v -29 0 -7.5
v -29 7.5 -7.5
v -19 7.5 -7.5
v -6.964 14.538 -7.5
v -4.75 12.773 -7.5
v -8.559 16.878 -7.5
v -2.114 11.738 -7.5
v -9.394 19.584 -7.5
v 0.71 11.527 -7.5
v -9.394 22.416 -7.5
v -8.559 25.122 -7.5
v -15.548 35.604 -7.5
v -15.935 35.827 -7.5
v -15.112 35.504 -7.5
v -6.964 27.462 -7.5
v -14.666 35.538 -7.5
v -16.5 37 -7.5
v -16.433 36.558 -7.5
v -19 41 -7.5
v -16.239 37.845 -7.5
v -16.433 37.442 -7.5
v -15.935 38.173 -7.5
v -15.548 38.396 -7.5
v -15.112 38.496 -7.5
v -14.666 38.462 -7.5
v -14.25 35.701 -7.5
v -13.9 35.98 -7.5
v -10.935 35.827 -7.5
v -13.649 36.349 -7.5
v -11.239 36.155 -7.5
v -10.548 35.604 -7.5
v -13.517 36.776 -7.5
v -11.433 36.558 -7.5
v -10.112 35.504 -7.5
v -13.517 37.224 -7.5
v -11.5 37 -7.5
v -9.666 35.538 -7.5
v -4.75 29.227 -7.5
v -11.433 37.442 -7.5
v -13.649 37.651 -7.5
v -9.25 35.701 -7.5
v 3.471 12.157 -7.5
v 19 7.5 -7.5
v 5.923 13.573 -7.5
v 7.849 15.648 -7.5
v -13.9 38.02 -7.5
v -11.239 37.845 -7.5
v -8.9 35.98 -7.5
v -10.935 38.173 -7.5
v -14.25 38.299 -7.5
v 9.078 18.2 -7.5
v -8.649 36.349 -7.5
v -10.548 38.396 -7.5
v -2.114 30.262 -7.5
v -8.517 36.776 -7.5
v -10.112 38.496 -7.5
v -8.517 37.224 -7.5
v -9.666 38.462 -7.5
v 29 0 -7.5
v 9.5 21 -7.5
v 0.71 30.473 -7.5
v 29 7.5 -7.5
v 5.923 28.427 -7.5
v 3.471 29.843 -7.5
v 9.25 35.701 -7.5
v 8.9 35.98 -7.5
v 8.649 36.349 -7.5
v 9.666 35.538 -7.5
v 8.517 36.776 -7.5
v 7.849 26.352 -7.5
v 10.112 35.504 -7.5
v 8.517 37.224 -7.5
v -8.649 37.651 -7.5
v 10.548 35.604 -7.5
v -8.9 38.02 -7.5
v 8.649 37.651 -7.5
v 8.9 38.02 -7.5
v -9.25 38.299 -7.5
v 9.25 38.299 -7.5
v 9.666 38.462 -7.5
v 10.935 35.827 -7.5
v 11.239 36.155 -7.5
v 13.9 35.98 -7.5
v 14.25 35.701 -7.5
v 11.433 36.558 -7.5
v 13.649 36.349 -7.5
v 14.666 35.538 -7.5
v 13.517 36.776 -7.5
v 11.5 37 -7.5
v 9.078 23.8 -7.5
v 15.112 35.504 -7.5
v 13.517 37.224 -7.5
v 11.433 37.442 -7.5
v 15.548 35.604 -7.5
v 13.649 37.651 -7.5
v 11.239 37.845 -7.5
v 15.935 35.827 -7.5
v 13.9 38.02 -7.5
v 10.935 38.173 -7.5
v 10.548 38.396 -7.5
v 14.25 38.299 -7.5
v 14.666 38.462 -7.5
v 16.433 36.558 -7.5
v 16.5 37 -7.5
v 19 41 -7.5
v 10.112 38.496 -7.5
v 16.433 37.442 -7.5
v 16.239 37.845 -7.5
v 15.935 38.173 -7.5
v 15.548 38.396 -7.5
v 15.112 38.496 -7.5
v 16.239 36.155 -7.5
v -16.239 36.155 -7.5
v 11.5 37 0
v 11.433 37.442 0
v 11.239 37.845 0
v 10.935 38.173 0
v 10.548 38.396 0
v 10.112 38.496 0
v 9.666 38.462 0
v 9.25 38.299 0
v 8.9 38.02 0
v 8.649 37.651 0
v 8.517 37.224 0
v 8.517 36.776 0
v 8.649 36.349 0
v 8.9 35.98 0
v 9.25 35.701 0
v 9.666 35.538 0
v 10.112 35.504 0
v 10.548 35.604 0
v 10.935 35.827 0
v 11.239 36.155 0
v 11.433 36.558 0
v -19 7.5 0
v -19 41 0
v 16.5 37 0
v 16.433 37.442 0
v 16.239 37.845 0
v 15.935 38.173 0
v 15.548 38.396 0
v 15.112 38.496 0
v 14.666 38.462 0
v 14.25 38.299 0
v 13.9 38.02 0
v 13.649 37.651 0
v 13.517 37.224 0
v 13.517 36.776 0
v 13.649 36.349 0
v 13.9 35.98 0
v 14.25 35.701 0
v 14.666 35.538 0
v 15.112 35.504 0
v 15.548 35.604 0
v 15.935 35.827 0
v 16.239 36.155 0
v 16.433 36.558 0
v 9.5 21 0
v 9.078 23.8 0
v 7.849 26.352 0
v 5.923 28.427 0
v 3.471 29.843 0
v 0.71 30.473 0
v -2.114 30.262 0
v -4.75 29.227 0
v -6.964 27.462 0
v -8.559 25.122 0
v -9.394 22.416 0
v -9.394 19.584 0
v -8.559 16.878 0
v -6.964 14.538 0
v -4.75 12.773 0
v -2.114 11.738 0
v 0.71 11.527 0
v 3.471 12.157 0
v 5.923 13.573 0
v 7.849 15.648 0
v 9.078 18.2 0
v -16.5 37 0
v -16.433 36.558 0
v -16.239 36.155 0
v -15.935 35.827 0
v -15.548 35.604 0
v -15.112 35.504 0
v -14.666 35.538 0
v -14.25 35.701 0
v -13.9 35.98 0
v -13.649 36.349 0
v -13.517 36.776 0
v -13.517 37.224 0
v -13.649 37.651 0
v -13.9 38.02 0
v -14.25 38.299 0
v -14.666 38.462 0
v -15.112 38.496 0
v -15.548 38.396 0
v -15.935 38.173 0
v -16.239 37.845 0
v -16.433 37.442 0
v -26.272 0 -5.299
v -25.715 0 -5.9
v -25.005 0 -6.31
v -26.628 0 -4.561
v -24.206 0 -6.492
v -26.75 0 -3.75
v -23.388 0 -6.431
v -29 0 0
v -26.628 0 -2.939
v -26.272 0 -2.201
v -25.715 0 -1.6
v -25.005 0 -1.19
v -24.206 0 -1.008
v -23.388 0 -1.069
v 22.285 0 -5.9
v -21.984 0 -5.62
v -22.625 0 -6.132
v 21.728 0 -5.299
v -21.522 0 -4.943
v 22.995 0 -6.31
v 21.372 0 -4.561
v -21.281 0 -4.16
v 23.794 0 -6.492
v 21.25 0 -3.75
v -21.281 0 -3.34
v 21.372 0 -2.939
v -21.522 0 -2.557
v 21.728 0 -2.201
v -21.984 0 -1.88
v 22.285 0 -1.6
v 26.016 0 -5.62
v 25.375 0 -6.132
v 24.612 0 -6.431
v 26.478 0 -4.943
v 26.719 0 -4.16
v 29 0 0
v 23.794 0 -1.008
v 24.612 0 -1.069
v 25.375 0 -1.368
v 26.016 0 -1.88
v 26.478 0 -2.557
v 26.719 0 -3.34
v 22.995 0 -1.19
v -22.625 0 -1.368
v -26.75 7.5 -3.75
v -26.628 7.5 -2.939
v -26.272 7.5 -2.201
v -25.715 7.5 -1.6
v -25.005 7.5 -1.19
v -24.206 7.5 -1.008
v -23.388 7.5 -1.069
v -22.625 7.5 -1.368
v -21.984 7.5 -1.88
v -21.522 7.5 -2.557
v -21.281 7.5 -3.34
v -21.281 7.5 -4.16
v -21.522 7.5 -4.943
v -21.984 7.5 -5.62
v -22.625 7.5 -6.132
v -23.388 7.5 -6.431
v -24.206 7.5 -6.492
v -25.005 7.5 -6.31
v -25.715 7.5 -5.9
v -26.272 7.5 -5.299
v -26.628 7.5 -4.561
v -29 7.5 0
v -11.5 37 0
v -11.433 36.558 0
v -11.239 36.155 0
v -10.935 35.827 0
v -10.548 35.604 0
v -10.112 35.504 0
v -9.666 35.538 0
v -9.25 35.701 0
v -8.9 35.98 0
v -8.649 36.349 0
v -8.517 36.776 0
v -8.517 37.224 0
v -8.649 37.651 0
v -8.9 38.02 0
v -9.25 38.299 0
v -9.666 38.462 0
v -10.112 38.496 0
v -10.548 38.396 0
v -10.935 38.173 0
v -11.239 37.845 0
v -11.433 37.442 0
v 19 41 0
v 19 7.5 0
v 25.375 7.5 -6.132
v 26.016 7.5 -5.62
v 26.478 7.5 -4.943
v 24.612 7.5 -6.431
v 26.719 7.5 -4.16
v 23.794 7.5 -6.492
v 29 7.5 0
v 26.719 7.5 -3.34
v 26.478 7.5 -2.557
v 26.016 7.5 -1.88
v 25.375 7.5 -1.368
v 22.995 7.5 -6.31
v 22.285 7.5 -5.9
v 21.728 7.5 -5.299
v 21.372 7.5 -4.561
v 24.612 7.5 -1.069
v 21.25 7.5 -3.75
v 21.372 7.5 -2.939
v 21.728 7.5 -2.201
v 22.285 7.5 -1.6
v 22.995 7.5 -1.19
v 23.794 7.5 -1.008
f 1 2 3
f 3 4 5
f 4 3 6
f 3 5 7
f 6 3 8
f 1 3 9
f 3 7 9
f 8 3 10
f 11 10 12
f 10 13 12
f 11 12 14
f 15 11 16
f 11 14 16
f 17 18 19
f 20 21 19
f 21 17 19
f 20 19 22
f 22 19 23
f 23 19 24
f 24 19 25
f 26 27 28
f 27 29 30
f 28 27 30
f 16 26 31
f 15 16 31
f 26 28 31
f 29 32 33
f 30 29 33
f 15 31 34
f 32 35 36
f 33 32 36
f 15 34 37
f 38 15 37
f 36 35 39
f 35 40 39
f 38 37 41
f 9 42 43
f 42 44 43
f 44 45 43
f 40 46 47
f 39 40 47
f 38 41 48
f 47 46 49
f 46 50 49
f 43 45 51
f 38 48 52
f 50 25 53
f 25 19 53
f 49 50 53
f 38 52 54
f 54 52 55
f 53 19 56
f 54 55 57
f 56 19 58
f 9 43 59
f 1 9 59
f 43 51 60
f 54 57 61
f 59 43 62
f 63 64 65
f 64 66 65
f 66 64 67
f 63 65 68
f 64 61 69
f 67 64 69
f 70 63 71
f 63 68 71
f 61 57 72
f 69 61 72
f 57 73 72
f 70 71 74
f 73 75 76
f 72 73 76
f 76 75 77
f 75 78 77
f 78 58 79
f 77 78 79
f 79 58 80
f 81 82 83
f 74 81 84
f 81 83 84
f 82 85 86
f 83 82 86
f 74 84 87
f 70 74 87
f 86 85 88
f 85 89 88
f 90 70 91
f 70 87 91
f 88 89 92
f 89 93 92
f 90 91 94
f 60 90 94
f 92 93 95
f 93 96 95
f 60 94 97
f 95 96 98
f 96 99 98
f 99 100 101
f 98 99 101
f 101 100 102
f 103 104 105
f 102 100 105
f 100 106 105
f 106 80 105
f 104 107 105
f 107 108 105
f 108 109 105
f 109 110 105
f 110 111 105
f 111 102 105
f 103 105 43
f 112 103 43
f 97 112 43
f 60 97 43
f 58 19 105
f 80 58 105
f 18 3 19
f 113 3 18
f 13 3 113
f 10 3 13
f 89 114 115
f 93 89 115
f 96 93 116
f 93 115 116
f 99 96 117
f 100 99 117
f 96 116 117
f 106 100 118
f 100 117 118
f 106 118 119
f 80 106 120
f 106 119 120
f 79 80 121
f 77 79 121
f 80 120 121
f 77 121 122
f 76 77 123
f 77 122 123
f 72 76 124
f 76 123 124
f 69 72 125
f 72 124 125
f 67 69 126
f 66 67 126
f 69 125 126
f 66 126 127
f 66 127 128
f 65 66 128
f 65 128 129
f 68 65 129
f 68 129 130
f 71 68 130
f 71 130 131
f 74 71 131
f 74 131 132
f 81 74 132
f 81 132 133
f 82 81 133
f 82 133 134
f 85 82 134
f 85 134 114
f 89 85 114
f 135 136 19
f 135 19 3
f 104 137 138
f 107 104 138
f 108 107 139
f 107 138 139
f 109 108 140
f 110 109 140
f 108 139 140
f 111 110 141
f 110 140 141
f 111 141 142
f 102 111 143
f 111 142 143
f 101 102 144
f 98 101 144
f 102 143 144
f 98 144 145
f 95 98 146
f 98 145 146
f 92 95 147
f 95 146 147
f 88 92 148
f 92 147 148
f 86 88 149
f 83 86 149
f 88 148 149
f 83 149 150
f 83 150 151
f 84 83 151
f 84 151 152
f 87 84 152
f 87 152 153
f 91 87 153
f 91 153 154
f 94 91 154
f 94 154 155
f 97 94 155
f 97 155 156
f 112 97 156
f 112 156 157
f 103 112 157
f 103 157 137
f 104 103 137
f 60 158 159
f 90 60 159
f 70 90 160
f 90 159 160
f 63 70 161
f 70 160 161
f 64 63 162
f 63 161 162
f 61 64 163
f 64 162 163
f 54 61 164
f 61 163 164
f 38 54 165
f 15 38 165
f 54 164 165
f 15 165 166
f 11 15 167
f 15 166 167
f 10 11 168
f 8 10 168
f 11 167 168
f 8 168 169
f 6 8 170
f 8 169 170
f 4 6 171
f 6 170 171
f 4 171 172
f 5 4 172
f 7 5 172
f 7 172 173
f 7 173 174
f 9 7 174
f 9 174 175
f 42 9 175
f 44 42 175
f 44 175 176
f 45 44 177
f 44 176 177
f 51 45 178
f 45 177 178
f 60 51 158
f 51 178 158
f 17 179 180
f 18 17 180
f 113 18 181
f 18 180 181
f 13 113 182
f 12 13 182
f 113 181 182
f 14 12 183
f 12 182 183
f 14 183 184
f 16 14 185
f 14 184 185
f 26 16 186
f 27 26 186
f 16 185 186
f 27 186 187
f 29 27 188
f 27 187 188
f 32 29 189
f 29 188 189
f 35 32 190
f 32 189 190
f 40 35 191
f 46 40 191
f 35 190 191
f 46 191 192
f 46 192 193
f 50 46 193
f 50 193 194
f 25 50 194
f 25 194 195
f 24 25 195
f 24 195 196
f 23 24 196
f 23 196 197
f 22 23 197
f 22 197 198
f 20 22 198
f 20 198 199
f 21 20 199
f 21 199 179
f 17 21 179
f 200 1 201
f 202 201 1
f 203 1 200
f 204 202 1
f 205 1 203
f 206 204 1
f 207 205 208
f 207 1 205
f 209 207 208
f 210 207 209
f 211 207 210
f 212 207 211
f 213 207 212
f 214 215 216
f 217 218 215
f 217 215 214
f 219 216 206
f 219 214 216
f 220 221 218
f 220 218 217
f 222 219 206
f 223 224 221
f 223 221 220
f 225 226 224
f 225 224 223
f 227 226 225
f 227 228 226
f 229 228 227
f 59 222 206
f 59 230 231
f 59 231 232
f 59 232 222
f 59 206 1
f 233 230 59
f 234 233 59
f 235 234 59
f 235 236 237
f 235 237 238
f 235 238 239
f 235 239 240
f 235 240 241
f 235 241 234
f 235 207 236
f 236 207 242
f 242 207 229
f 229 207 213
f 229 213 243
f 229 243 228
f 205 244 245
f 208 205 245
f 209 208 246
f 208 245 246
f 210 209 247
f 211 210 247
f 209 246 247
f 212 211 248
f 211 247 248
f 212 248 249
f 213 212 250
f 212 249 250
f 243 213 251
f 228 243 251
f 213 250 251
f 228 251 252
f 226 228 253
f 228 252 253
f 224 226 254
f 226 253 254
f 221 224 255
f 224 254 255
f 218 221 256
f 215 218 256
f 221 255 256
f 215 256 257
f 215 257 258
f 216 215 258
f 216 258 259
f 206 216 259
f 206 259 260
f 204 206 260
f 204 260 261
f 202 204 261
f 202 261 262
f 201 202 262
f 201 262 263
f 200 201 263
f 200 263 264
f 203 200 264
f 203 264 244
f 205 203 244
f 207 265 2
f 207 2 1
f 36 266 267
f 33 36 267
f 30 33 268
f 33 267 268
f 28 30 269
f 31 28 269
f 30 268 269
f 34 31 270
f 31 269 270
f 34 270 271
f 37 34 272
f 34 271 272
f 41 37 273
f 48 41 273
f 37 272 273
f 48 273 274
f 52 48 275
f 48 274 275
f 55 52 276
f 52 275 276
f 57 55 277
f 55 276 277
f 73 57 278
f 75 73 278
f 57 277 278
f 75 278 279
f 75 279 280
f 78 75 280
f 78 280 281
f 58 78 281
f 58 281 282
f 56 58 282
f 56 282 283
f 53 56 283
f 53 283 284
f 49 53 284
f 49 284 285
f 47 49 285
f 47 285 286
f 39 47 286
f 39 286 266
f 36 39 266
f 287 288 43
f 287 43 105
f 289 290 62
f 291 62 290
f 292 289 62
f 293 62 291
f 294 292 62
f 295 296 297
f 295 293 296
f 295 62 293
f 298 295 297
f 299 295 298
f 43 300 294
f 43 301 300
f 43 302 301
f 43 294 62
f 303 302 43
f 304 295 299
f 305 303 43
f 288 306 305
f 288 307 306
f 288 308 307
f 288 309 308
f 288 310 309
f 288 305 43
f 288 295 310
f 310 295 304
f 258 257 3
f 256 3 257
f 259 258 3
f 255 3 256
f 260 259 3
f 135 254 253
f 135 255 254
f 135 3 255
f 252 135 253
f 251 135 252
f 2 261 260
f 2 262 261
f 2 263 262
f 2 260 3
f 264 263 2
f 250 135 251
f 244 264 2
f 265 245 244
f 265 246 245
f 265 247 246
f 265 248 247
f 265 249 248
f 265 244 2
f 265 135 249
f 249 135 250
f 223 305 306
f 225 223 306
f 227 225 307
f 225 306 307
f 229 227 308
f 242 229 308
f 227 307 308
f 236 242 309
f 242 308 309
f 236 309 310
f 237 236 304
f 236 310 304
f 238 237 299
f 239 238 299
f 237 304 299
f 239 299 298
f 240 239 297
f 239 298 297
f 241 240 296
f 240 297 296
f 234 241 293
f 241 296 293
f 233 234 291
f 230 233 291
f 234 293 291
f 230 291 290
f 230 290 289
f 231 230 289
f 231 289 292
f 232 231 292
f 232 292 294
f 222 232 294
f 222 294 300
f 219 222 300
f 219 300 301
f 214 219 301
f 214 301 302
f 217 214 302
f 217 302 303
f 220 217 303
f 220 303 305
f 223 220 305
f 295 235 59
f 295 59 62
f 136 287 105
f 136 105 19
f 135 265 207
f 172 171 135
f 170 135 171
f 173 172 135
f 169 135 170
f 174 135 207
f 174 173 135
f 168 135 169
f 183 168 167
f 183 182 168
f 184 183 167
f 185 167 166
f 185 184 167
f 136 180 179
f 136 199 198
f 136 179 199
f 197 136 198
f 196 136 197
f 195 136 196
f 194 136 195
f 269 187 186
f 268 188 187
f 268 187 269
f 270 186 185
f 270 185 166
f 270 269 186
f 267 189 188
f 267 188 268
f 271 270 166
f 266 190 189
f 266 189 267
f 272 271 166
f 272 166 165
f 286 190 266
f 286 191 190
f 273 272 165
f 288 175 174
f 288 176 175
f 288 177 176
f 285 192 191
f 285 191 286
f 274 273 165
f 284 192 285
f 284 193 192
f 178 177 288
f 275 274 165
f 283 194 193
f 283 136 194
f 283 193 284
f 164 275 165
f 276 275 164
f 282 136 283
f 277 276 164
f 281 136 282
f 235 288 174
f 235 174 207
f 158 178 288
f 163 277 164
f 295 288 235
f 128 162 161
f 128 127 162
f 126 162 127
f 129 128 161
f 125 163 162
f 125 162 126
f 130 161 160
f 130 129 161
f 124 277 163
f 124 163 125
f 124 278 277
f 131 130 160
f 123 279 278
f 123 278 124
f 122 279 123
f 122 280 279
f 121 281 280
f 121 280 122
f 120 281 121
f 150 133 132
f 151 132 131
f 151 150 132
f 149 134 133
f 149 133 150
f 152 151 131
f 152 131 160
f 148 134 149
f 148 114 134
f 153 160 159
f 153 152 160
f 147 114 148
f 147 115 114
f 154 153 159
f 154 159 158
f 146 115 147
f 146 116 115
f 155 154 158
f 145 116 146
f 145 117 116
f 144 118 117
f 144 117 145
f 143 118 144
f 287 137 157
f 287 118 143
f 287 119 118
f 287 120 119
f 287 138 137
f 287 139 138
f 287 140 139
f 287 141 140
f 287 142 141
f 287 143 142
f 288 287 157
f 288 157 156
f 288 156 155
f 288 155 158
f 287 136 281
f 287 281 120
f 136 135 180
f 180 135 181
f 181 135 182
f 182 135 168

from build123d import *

# Parameters (mm, degrees)
SKETCH1_R           = 9.5
BOSS_EXTRUDE1_DEPTH = 7.5
SKETCH2_R           = 1.5
CUT_EXTRUDE2_DEPTH  = 51.776470929
SKETCH3_R           = 2.75
CUT_EXTRUDE3_DEPTH  = 45.938847337


with BuildPart() as part:
    # Sketch1 → Boss-Extrude1 (new body)
    with BuildSketch(Plane.XY):
        Polygon((-29, 0), (29, 0), (29, 7.5), (19, 7.5), (19, 41), (-19, 41), (-19, 7.5), (-29, 7.5), align=None)
        with Locations((0, 21)):
            Circle(SKETCH1_R, mode=Mode.SUBTRACT)
    extrude(amount=-BOSS_EXTRUDE1_DEPTH)

    # Sketch2 → Cut-Extrude2 (cut, through all)
    with BuildSketch(Plane.XY):
        with Locations((10, 37)):
            Circle(SKETCH2_R)
        with Locations((15, 37)):
            Circle(SKETCH2_R)
        with Locations(Location((-15, 37, 0), (0, 0, 180))):
            Circle(SKETCH2_R)
        with Locations(Location((-10, 37, 0), (0, 0, 180))):
            Circle(SKETCH2_R)
    extrude(amount=-CUT_EXTRUDE2_DEPTH, mode=Mode.SUBTRACT)

    # Sketch3 → Cut-Extrude3 (cut, through all)
    with BuildSketch(Plane(origin=(0, 7.5, 0), x_dir=(1, 0, 0), z_dir=(0, 1, 0))):
        with Locations(Location((-24, 3.75, 0), (0, 0, 180))):
            Circle(SKETCH3_R)
        with Locations(Location((24, 3.75, 0), (0, 0, 180))):
            Circle(SKETCH3_R)
    extrude(amount=-CUT_EXTRUDE3_DEPTH, mode=Mode.SUBTRACT)


solid = part.part
